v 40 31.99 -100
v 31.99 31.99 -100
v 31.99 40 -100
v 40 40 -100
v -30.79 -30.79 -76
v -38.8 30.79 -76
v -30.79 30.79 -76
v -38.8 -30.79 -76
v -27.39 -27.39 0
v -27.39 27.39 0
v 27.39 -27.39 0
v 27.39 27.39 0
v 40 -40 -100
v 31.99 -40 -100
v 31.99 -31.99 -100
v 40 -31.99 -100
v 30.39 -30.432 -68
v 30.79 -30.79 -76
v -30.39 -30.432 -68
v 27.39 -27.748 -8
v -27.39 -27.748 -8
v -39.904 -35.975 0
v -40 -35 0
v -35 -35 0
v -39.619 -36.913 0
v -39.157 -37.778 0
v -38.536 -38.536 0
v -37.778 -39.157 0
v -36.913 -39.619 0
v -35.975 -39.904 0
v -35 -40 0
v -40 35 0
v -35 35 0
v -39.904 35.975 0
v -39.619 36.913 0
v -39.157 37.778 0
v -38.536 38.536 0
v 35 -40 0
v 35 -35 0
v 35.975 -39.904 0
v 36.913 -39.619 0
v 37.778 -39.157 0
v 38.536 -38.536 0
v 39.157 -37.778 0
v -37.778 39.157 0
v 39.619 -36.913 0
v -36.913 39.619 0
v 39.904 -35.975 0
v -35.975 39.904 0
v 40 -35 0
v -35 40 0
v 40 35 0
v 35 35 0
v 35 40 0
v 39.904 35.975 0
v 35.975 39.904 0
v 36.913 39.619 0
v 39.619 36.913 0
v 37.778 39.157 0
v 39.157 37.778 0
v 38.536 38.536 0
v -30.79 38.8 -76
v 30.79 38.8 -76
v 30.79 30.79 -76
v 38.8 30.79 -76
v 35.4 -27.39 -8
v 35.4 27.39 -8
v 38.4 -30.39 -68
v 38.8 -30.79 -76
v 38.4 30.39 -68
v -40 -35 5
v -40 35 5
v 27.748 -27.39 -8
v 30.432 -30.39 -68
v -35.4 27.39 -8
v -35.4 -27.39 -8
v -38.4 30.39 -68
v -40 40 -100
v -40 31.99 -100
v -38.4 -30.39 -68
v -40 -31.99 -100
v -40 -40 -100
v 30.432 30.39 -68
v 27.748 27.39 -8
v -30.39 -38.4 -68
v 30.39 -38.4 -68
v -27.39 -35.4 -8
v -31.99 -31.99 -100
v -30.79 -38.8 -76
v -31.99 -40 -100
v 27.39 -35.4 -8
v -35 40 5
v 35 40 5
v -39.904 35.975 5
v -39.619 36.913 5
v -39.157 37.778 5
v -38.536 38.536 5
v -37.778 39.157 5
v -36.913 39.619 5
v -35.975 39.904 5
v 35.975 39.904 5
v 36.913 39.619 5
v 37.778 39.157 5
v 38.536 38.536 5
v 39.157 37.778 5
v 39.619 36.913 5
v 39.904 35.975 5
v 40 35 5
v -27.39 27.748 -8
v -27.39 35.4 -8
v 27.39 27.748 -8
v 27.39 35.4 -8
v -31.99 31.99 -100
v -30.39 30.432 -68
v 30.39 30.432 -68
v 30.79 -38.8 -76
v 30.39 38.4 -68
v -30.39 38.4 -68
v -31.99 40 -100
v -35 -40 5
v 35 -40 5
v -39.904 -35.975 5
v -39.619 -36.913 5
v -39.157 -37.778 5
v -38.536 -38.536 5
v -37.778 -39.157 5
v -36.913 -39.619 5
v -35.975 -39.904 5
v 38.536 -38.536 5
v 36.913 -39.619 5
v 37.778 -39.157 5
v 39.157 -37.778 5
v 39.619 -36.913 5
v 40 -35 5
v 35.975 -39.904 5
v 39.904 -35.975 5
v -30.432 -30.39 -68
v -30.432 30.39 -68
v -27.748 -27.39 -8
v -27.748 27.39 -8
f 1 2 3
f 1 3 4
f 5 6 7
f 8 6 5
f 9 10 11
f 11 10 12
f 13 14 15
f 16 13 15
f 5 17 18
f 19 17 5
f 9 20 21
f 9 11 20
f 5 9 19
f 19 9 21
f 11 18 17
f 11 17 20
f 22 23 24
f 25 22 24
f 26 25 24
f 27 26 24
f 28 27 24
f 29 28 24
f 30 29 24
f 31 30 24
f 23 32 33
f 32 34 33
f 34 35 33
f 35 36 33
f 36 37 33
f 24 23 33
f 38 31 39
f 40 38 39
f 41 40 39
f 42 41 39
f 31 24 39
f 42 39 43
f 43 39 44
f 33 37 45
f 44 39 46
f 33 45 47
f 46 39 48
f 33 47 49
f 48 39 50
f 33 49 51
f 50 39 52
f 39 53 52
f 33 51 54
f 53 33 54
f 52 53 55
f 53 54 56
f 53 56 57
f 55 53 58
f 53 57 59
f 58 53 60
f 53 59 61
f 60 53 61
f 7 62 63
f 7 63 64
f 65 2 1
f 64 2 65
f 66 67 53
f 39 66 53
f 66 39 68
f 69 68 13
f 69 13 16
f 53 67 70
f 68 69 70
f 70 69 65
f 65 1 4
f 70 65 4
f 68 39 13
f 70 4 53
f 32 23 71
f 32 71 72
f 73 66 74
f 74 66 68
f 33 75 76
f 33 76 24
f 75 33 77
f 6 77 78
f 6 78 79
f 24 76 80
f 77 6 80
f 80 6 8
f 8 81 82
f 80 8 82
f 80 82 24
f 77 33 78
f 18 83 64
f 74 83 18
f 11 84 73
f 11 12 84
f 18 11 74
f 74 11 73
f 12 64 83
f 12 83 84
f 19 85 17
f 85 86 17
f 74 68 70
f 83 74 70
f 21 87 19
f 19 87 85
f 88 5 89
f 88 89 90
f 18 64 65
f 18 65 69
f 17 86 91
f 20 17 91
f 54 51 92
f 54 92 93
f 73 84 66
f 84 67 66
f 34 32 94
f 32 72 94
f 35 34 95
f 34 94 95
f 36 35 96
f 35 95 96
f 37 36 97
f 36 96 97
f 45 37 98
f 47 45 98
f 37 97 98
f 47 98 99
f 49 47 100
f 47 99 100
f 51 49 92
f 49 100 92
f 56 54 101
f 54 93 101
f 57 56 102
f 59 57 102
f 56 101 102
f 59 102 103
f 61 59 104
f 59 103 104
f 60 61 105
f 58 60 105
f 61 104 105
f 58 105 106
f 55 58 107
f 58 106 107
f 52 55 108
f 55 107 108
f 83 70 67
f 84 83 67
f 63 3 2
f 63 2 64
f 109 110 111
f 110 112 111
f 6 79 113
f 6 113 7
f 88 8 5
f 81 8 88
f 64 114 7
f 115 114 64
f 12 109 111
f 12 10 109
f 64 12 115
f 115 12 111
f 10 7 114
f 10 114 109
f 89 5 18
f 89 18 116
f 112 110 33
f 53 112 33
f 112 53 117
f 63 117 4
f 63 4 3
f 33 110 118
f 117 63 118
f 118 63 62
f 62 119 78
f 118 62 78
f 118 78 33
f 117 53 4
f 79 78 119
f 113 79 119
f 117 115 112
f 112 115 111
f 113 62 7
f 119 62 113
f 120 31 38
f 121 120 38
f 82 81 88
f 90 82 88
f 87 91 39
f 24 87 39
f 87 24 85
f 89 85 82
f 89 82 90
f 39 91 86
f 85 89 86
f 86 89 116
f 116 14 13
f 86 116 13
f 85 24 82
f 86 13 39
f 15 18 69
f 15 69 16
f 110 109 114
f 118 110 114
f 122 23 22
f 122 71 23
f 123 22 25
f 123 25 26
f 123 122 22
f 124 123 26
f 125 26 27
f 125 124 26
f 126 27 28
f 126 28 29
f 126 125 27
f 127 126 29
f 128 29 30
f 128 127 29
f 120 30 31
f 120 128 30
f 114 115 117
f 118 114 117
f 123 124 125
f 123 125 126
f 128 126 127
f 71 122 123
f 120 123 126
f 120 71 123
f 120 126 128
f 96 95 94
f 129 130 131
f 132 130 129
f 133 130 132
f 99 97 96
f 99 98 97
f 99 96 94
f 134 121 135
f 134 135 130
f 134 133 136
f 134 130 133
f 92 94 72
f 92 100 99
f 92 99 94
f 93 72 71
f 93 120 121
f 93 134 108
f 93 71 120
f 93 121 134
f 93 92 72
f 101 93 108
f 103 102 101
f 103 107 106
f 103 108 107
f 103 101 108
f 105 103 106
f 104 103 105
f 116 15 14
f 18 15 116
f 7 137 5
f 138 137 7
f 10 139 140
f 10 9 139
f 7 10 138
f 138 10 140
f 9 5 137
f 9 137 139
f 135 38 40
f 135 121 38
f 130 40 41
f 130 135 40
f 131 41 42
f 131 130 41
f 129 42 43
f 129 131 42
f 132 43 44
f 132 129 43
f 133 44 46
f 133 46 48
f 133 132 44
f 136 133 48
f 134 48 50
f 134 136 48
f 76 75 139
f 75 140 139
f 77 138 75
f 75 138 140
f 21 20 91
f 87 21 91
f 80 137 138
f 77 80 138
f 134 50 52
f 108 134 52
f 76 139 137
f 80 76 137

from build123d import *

# Parameters (mm, degrees)
F0_W      = 70
F0_H      = 70
F2_W      = 80
F2_H      = 80
F5_DEPTH  = 62.8
F7_DEPTH  = 96
F8_W      = 61.5800124844
F8_H      = 61.5800124844
F9_W      = 54.7800124844
F9_H      = 54.7800124844
F11_W     = 80
F11_H     = 80
F12_DEPTH = 5
F13_R     = 5


with BuildPart() as f3:
    # F0 (on Top) → F3 section 0
    with BuildSketch(Plane.XY):
        Rectangle(F0_W, F0_H)
    # F2 (on offset) → F3 section 1
    with BuildSketch(Plane.XY.offset(-100)):
        Rectangle(F2_W, F2_H)
    loft()

    # F4 (on Front) → F5 (cut, symmetric)
    with BuildSketch(Plane.XZ):
        Polygon((-31.9900062422, -100), (31.9900062422, -100), (30.7900062422, -76), (-30.7900062422, -76), align=None)
        Polygon((27.3900062422, -8), (-27.3900062422, -8), (-30.3900062422, -68), (30.3900062422, -68), align=None)
    extrude(amount=F5_DEPTH, both=True, mode=Mode.SUBTRACT)

    # F6 (on Right) → F7 (cut, symmetric)
    with BuildSketch(Plane.YZ):
        Polygon((-31.9900062422, -100), (31.9900062422, -100), (30.7900062422, -76), (-30.7900062422, -76), align=None)
        Polygon((30.3900062422, -68), (27.3900062422, -8), (-27.3900062422, -8), (-30.3900062422, -68), align=None)
    extrude(amount=F7_DEPTH, both=True, mode=Mode.SUBTRACT)

    # F8 (on face) → F10 section 0
    with BuildSketch(Plane(origin=(0, 0, -76), x_dir=(1, 0, 0), z_dir=(0, 0, -1))):
        Rectangle(F8_W, F8_H)
    # F9 (on face) → F10 section 1
    with BuildSketch(Plane.XY):
        Rectangle(F9_W, F9_H)
    loft(mode=Mode.SUBTRACT)

    # F11 (on face) → F12 (join)
    with BuildSketch(Plane.XY):
        Rectangle(F11_W, F11_H)
    extrude(amount=F12_DEPTH)

    # F13
    f13_edges = [f3.edges().sort_by_distance(p)[0] for p in [
        (-40, 40, 2.5),
        (-40, -40, 2.5),
        (40, -40, 2.5),
        (40, 40, 2.5),
    ]]
    fillet(f13_edges, radius=F13_R)


solid = f3.part
